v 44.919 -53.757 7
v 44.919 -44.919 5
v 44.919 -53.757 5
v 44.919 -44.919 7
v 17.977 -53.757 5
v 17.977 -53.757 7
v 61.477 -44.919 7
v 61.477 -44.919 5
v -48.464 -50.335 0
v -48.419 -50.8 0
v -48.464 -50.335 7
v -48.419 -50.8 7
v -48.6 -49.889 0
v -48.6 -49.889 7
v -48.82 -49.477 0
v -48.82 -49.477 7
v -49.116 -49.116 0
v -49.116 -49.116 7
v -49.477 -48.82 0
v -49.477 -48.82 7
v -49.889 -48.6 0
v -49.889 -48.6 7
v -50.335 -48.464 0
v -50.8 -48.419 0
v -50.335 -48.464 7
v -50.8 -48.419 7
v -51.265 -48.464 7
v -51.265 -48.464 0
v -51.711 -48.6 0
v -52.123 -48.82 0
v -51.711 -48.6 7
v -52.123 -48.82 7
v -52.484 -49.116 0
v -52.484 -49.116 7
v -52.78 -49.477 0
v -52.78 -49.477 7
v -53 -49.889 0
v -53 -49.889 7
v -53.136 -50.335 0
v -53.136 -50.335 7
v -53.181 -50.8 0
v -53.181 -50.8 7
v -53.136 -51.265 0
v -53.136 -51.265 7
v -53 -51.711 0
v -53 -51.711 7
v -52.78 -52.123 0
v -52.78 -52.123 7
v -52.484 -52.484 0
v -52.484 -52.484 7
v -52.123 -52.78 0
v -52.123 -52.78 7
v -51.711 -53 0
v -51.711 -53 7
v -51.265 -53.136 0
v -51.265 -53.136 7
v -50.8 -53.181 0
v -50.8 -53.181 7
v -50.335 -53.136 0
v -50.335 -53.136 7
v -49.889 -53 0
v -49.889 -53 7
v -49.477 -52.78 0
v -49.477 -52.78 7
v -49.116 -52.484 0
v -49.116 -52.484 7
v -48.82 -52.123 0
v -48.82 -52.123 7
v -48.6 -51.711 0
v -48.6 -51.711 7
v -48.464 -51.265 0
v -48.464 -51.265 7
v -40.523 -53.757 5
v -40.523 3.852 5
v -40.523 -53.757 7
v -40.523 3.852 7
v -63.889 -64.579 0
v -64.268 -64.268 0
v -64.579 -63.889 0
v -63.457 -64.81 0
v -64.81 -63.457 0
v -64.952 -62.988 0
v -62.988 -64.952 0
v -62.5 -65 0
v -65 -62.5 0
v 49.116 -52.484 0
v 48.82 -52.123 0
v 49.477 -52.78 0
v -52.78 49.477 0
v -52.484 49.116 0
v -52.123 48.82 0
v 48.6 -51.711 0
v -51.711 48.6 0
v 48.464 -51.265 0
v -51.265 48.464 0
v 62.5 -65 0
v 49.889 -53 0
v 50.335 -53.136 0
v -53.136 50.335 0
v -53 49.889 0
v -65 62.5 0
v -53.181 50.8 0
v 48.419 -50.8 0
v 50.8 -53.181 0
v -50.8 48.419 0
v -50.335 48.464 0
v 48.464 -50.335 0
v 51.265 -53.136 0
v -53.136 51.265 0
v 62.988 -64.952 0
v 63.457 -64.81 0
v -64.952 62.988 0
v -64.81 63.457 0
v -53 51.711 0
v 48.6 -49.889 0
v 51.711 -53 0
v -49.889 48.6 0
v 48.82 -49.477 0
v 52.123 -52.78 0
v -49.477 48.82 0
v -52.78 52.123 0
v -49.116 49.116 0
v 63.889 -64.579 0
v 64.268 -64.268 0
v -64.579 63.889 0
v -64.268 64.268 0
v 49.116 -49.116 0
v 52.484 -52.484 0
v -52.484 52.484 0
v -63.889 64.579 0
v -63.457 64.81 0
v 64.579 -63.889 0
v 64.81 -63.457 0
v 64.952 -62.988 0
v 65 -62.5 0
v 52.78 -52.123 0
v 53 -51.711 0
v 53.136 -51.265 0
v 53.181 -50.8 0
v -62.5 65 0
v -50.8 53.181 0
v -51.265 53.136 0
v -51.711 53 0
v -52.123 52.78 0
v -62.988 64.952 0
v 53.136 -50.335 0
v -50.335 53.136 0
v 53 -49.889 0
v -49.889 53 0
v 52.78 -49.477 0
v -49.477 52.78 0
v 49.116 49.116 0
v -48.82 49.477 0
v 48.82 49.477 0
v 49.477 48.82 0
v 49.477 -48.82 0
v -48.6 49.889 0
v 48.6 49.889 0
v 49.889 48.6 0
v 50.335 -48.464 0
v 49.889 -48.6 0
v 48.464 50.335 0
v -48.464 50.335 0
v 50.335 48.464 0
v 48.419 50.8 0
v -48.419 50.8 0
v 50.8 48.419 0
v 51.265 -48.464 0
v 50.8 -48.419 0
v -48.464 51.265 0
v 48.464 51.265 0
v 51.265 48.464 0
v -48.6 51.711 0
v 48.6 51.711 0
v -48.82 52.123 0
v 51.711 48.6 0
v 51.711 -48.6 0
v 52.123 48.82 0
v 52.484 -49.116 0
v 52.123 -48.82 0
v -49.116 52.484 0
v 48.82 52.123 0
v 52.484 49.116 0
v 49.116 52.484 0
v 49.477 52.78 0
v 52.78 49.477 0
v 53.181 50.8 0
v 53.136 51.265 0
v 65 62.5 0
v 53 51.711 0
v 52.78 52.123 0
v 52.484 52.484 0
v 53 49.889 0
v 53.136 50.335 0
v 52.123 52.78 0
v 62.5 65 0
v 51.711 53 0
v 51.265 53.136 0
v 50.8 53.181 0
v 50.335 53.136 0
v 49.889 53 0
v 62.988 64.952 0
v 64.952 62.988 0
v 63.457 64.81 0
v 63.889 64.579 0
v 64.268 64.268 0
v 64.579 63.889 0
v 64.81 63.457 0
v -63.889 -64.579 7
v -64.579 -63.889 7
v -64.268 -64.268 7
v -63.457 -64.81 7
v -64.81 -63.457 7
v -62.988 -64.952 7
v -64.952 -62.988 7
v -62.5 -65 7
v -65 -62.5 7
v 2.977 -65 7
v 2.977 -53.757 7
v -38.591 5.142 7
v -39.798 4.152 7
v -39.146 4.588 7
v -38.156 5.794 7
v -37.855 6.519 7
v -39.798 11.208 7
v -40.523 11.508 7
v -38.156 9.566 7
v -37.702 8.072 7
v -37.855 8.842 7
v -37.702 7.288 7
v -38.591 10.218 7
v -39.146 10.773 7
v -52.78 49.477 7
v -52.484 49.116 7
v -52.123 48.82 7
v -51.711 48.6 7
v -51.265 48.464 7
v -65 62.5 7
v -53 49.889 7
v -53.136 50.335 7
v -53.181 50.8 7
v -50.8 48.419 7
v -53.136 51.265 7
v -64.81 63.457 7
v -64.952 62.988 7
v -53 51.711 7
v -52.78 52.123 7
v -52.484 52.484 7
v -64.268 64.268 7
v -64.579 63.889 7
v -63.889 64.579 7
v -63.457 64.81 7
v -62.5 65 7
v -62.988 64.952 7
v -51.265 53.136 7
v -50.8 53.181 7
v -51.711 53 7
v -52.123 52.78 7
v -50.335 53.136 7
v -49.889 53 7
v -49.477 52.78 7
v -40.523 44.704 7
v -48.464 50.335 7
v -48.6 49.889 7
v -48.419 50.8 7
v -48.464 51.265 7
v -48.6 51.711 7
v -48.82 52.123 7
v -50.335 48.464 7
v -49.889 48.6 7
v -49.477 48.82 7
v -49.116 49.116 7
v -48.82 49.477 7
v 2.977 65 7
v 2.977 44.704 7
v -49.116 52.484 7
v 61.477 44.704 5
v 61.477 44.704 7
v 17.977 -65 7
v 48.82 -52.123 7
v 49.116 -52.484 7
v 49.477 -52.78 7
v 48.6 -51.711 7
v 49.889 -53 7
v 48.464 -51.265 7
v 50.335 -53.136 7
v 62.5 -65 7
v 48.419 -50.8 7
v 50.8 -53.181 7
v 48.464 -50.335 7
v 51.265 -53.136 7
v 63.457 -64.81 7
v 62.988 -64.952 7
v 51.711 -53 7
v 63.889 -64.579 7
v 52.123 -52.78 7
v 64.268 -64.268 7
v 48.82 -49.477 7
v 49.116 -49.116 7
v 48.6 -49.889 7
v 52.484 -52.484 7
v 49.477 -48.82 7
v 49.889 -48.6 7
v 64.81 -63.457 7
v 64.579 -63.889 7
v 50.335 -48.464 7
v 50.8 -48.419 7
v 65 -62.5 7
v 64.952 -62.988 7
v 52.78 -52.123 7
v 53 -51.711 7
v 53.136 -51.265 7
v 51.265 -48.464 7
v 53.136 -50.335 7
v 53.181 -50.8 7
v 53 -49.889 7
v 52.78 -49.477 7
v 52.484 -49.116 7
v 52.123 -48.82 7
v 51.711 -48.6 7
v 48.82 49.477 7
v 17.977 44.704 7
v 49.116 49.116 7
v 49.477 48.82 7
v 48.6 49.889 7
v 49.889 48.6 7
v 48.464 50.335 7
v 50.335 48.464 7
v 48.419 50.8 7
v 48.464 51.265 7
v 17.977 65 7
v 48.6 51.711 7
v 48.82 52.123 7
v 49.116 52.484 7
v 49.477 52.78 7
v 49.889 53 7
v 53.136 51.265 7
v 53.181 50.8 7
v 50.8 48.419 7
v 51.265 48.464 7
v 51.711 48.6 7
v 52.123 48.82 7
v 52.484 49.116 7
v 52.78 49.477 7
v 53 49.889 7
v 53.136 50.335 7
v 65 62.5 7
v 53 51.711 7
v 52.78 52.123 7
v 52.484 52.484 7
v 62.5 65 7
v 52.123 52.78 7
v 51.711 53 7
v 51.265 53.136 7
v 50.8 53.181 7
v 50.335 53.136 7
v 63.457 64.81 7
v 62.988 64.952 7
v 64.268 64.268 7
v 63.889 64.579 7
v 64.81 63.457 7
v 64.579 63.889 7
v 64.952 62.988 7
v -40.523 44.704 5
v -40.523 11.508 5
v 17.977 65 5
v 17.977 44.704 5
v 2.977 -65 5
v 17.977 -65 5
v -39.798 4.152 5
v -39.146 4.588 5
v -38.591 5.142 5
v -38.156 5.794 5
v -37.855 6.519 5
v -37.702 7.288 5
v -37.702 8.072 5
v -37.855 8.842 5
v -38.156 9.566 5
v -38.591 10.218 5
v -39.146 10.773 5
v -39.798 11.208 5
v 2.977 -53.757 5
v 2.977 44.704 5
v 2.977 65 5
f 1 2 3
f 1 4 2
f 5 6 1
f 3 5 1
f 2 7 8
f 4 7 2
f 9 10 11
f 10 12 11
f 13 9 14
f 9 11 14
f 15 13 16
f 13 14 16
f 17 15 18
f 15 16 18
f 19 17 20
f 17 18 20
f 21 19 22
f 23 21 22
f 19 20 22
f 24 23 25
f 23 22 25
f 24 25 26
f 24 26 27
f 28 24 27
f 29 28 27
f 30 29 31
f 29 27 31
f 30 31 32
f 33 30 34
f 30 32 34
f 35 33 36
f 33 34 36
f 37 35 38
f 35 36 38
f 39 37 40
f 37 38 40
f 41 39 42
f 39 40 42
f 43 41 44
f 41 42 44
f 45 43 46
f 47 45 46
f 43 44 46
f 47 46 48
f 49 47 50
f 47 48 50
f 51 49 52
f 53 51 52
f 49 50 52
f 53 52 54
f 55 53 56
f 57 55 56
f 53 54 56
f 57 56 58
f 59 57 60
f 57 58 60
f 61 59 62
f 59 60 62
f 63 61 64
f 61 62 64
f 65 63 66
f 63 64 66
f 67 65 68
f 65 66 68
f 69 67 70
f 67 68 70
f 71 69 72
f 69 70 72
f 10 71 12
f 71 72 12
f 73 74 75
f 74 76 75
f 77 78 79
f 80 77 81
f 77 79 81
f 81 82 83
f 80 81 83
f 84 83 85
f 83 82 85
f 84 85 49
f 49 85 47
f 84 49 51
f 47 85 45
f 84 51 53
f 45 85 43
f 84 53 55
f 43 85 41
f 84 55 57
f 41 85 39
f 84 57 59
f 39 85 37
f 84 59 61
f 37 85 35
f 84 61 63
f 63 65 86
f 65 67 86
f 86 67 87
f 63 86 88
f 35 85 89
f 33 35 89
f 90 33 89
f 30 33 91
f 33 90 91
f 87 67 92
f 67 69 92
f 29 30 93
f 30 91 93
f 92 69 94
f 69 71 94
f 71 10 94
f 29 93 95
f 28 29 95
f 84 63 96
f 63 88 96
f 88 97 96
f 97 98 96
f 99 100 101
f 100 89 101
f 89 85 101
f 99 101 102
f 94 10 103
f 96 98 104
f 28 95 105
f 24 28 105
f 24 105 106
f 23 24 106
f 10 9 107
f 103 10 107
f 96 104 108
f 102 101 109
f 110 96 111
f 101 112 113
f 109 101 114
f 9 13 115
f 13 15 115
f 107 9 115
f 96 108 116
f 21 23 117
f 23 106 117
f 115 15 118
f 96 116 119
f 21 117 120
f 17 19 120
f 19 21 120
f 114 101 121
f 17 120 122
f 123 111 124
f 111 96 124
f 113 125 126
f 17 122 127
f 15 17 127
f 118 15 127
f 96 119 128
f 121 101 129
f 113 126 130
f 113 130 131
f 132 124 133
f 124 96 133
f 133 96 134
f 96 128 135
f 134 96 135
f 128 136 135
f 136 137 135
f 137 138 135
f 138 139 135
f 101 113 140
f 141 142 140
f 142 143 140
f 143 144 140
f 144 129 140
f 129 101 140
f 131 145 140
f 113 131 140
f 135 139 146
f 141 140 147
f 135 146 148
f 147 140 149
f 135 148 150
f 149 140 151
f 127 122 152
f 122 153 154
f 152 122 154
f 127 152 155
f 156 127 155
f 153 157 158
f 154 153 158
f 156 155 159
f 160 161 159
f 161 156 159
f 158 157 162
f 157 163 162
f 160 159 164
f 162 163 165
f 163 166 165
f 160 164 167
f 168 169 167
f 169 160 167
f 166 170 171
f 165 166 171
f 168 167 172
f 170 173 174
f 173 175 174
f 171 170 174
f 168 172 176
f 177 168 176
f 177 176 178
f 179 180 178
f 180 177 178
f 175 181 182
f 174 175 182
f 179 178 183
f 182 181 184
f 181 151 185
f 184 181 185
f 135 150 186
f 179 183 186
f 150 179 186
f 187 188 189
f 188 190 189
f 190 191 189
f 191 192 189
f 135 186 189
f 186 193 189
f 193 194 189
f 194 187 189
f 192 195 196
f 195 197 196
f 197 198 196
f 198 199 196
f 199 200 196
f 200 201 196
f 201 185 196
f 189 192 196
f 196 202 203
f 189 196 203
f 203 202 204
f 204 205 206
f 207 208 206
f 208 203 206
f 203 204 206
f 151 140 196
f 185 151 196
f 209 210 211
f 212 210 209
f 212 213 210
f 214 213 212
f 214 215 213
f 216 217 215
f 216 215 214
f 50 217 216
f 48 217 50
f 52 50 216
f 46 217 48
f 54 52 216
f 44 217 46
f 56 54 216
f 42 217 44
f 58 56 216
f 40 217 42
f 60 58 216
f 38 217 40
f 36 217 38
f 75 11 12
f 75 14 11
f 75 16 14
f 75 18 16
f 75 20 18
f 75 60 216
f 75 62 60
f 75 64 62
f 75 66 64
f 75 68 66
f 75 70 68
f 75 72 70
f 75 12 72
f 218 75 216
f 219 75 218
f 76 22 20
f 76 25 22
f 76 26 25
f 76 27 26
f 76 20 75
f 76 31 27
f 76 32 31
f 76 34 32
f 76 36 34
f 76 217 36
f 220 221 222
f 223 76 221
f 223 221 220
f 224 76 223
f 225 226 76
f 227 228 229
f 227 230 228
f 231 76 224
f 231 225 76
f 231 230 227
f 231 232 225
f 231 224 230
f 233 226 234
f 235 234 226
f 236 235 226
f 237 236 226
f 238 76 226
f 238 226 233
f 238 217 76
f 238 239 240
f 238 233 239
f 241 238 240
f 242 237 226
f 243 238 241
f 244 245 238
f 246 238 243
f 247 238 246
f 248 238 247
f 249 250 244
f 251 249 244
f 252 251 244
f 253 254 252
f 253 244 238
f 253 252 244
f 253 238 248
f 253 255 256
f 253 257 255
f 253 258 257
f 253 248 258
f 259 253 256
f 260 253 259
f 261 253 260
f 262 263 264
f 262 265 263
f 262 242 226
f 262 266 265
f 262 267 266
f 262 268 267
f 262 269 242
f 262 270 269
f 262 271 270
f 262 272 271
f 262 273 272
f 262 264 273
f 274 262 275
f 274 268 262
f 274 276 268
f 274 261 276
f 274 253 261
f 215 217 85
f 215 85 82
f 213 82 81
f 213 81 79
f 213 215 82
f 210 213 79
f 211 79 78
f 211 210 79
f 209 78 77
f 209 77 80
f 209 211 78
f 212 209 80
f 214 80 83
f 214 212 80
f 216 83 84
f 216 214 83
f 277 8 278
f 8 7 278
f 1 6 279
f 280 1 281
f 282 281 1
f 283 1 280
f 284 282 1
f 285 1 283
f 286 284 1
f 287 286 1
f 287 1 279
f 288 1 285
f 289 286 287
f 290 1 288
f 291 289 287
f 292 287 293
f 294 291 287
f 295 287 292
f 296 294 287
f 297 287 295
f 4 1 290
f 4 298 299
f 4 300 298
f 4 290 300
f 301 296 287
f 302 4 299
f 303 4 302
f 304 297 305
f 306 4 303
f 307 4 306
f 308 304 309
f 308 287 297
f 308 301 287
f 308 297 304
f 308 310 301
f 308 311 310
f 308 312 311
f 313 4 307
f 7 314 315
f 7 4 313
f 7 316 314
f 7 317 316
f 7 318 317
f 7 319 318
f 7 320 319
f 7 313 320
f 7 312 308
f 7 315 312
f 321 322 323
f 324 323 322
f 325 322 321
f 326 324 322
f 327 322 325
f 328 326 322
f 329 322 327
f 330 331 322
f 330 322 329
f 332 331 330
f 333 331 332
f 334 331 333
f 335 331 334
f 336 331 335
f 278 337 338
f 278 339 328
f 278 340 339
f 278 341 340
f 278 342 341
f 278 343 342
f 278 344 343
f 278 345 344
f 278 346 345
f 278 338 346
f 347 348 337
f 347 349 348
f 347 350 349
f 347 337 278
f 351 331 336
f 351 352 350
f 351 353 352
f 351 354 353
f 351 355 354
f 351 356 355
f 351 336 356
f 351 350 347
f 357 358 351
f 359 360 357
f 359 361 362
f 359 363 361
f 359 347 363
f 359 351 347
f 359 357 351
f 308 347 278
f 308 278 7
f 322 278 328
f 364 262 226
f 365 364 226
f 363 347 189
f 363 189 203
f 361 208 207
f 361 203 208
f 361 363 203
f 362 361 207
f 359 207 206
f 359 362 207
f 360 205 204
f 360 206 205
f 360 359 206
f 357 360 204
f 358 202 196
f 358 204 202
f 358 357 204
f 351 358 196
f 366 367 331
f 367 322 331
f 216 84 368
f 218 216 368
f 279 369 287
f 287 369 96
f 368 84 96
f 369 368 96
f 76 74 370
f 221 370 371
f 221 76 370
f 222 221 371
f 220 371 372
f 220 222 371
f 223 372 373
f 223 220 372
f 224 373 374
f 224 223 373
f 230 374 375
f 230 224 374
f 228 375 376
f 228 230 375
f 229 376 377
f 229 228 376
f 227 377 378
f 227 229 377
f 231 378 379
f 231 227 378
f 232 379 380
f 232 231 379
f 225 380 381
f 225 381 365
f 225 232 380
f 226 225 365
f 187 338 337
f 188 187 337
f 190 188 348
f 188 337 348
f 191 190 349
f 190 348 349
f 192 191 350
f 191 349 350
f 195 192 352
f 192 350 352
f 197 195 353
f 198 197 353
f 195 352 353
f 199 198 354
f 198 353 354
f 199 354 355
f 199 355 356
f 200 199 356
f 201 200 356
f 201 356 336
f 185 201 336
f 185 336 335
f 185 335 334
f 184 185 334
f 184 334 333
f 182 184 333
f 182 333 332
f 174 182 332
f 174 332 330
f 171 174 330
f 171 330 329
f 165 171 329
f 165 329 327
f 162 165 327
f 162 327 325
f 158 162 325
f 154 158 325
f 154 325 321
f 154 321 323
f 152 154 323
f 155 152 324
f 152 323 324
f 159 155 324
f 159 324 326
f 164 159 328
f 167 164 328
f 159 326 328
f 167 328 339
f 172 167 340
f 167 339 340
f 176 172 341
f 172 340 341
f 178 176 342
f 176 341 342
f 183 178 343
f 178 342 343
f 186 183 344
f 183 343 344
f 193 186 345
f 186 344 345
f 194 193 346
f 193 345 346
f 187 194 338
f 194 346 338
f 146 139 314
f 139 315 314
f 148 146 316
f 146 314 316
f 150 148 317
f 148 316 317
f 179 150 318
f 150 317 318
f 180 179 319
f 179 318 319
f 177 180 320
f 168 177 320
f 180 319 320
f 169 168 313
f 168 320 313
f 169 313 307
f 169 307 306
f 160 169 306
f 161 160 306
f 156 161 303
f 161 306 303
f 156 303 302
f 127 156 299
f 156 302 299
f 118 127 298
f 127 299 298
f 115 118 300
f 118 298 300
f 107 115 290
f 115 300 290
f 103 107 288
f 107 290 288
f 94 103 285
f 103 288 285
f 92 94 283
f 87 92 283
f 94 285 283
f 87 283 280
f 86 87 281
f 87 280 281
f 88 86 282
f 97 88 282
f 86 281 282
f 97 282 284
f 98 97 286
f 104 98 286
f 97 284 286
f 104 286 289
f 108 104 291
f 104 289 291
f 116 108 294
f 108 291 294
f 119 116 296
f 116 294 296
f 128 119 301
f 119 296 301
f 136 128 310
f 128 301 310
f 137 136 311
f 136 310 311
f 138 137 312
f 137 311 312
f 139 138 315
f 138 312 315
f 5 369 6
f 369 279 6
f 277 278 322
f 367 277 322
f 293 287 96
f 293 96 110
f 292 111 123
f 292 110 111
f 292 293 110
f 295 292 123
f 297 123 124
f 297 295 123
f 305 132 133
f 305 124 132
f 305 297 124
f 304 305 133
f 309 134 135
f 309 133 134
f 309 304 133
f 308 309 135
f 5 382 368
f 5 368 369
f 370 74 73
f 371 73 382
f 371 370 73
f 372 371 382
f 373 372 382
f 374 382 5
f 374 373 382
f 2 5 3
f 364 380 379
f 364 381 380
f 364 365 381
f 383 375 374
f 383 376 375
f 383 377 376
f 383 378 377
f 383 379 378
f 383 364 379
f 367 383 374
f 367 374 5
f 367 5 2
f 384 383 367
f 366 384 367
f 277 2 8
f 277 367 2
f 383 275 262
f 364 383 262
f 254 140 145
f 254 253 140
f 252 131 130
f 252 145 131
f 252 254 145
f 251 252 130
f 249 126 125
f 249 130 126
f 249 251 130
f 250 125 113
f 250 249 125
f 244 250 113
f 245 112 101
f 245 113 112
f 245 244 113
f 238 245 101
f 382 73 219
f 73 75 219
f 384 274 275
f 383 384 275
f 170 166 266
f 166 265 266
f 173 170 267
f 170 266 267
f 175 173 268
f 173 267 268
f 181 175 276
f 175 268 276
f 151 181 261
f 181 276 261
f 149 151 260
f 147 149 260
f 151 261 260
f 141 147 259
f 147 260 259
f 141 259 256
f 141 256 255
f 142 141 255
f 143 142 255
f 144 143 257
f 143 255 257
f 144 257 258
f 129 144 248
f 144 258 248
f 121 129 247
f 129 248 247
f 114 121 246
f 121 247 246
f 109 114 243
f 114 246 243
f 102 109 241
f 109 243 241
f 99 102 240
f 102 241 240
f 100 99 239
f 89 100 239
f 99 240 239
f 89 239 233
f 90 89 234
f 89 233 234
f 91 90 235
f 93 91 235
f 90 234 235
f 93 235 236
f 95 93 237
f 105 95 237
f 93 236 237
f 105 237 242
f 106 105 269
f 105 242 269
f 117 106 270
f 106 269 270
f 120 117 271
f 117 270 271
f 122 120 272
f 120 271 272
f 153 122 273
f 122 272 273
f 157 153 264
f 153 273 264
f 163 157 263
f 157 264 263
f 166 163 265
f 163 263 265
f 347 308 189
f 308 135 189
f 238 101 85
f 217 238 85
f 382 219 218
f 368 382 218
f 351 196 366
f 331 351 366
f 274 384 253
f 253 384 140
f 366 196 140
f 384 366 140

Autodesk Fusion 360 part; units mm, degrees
ref_plane "WorkPlane1" through (0, 0, 7) normal (0, 0, 1) x (1, 0, 0)
sketch "Square Base Plate Sketch" plane through (0, 0, 0) normal (0, 0, 1) x (1, 0, 0)
  line L0 (-65, -65) -> (65, -65)
  line L1 (65, -65) -> (65, 65)
  line L2 (65, 65) -> (-65, 65)
  line L3 (-65, 65) -> (-65, -65)
extrude "Square Base Plate" add sketch "Square Base Plate Sketch" along normal blind 7
fillet "Fillet1" radius 2.5 4 edges at (-65, 65, 3.5) (65, 65, 3.5) (65, -65, 3.5) (-65, -65, 3.5)
sketch "Wafer Nest Pocket Sketch" plane through (0, 0, 7) normal (0, 0, 1) x (1, 0, 0)
  line L0 (-40.523, -53.7567) -> (61.477, -53.7567)
  line L1 (61.477, -53.7567) -> (61.477, 44.704)
  line L2 (61.477, 44.704) -> (-40.523, 44.704)
  line L3 (-40.523, 44.704) -> (-40.523, -53.7567)
extrude "Wafer Nest Pocket" cut sketch "Wafer Nest Pocket Sketch" against normal blind 2
sketch "Front-Center Access Relief Sketch" plane through (0, 0, 7) normal (0, 0, 1) x (1, 0, 0)
  line L0 (2.977, -66) -> (17.977, -66)
  line L1 (17.977, -66) -> (17.977, -50.7567)
  line L2 (17.977, -50.7567) -> (2.977, -50.7567)
  line L3 (2.977, -50.7567) -> (2.977, -66)
extrude "Front-Center Access Relief" cut sketch "Front-Center Access Relief Sketch" against normal blind 2
sketch "Rear-Center Access Relief Sketch" plane through (0, 0, 7) normal (0, 0, 1) x (1, 0, 0)
  line L0 (2.977, 41.704) -> (17.977, 41.704)
  line L1 (17.977, 41.704) -> (17.977, 66)
  line L2 (17.977, 66) -> (2.977, 66)
  line L3 (2.977, 66) -> (2.977, 41.704)
extrude "Rear-Center Access Relief" cut sketch "Rear-Center Access Relief Sketch" against normal blind 2
sketch "X Datum Bump Sketch (165 deg / 9:30)" plane through (0, 0, 7) normal (0, 0, 1) x (1, 0, 0)
  circle A0 centre (-41.683, 7.6802) radius 4
extrude "X Datum Bump (165 deg / 9:30)" add sketch "X Datum Bump Sketch (165 deg / 9:30)" against normal blind 2
sketch "Front-Right Corner Clip (dowel) Sketch" plane through (0, 0, 7) normal (0, 0, 1) x (1, 0, 0)
  line L0 (44.9187, -53.7567) -> (61.477, -53.7567)
  line L1 (61.477, -53.7567) -> (61.477, -44.9187)
  line L2 (61.477, -44.9187) -> (44.9187, -44.9187)
  line L3 (44.9187, -44.9187) -> (44.9187, -53.7567)
extrude "Front-Right Corner Clip (dowel)" add sketch "Front-Right Corner Clip (dowel) Sketch" against normal blind 2
sketch "Outer Front Left Dowel Bore Sketch" plane through (0, 0, 7) normal (0, 0, 1) x (1, 0, 0)
  circle A0 centre (-50.8, -50.8) radius 2.3813
extrude "Outer Front Left Dowel Bore" cut sketch "Outer Front Left Dowel Bore Sketch" against normal blind 7
sketch "Outer Front Right Dowel Bore Sketch" plane through (0, 0, 7) normal (0, 0, 1) x (1, 0, 0)
  circle A0 centre (50.8, -50.8) radius 2.3813
extrude "Outer Front Right Dowel Bore" cut sketch "Outer Front Right Dowel Bore Sketch" against normal blind 7
sketch "Outer Rear Left Dowel Bore Sketch" plane through (0, 0, 7) normal (0, 0, 1) x (1, 0, 0)
  circle A0 centre (-50.8, 50.8) radius 2.3813
extrude "Outer Rear Left Dowel Bore" cut sketch "Outer Rear Left Dowel Bore Sketch" against normal blind 7
sketch "Outer Rear Right Dowel Bore Sketch" plane through (0, 0, 7) normal (0, 0, 1) x (1, 0, 0)
  circle A0 centre (50.8, 50.8) radius 2.3813
extrude "Outer Rear Right Dowel Bore" cut sketch "Outer Rear Right Dowel Bore Sketch" against normal blind 7
equation "gridPitch = 25.4 mm" comment "Table hole-grid pitch"
equation "indexMove = 50.8 mm" comment "Two-grid-space indexing move"
equation "outerPinPatternSpan = 101.6 mm" comment "Four-space outer pin span"
equation "dowelDiameter = 4.7625 mm" comment "3/16 in steel locating dowel diameter"
equation "dowelHoleDiameter = 4.7625 mm" comment "3/16 in reamed dowel bore"
equation "basePlateSize = 130.0 mm" comment "Square base plate side length"
equation "baseThickness = 7.0 mm" comment "Base plate thickness"
equation "pocketDepth = 2.0 mm" comment "Wafer-nest pocket depth"
equation "nestClearance = 1.0 mm" comment "Loose gap at left/right/rear pocket walls"
equation "filletRadius = 2.5 mm" comment "Base-plate corner fillet radius"
equation "primaryFlatClearance = 0.175 mm" comment "Front wall forward of nominal flat"
equation "xBumpDiameter = 8.0 mm" comment "X-datum bump diameter"
equation "nestReliefWidth = 15.0 mm" comment "Front/rear access relief width"
equation "nestOffsetX = 7.29 mm" comment "Nest X from pin-square center"
equation "nestOffsetY = -4.95 mm" comment "Nest Y from pin-square center"
